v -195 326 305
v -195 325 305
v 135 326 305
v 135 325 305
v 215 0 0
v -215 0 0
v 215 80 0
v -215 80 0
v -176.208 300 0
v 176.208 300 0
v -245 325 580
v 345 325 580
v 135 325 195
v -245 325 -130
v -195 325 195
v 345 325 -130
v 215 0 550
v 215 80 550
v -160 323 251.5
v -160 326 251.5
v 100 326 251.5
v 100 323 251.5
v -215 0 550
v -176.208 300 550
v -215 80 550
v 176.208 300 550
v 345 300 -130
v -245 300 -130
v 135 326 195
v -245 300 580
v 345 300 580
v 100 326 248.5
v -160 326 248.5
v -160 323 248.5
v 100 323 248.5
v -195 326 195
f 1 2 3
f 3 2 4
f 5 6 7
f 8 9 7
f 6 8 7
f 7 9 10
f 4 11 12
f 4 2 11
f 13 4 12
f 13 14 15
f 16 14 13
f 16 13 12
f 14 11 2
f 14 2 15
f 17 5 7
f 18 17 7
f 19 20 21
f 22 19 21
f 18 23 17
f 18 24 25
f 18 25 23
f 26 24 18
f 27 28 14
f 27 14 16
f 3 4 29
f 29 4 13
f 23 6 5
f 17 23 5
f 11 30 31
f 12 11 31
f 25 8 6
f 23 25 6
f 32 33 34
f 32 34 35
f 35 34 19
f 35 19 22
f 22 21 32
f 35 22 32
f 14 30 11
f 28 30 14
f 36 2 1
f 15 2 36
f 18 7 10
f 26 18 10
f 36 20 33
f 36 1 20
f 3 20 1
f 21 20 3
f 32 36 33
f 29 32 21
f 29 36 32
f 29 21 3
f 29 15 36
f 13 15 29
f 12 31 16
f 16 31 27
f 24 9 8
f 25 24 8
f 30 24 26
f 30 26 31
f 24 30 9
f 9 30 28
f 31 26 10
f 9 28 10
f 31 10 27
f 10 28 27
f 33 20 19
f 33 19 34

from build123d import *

# Parameters (mm, degrees)
BOSS_EXTRU_1_DEPTH      = 550
ESQUISSE2_W             = 590
ESQUISSE2_H             = 710
BOSS_EXTRU_2_DEPTH      = 25
ESQUISSE3_W             = 330
ESQUISSE3_H             = 110
BOSS_EXTRU_3_DEPTH      = 1
ESQUISSE4_W             = 260
ESQUISSE4_H             = 3
ENL_V_MAT_EXTRU_1_DEPTH = 3


with BuildPart() as part:
    # Esquisse1 → Boss.-Extru.1 (new body)
    with BuildSketch(Plane.XY):
        Polygon((-215, 0), (215, 0), (215, 80), (176.208064244, 300), (-176.208064244, 300), (-215, 80), align=None)
    extrude(amount=BOSS_EXTRU_1_DEPTH)

    # Esquisse2 → Boss.-Extru.2 (add)
    with BuildSketch(Plane(origin=(0, 300, 0), x_dir=(1, 0, 0), z_dir=(0, 1, 0))):
        with Locations((50, -225)):
            Rectangle(ESQUISSE2_W, ESQUISSE2_H)
    extrude(amount=BOSS_EXTRU_2_DEPTH)

    # Esquisse3 → Boss.-Extru.3 (add)
    with BuildSketch(Plane(origin=(0, 325, 0), x_dir=(1, 0, 0), z_dir=(0, 1, 0))):
        with Locations((-30, -250)):
            Rectangle(ESQUISSE3_W, ESQUISSE3_H)
    extrude(amount=BOSS_EXTRU_3_DEPTH)

    # Esquisse4 → Enlèv. mat.-Extru.1 (cut)
    with BuildSketch(Plane(origin=(0, 326, 0), x_dir=(1, 0, 0), z_dir=(0, 1, 0))):
        with Locations((-30, -250)):
            Rectangle(ESQUISSE4_W, ESQUISSE4_H)
    extrude(amount=-ENL_V_MAT_EXTRU_1_DEPTH, mode=Mode.SUBTRACT)


solid = part.part
